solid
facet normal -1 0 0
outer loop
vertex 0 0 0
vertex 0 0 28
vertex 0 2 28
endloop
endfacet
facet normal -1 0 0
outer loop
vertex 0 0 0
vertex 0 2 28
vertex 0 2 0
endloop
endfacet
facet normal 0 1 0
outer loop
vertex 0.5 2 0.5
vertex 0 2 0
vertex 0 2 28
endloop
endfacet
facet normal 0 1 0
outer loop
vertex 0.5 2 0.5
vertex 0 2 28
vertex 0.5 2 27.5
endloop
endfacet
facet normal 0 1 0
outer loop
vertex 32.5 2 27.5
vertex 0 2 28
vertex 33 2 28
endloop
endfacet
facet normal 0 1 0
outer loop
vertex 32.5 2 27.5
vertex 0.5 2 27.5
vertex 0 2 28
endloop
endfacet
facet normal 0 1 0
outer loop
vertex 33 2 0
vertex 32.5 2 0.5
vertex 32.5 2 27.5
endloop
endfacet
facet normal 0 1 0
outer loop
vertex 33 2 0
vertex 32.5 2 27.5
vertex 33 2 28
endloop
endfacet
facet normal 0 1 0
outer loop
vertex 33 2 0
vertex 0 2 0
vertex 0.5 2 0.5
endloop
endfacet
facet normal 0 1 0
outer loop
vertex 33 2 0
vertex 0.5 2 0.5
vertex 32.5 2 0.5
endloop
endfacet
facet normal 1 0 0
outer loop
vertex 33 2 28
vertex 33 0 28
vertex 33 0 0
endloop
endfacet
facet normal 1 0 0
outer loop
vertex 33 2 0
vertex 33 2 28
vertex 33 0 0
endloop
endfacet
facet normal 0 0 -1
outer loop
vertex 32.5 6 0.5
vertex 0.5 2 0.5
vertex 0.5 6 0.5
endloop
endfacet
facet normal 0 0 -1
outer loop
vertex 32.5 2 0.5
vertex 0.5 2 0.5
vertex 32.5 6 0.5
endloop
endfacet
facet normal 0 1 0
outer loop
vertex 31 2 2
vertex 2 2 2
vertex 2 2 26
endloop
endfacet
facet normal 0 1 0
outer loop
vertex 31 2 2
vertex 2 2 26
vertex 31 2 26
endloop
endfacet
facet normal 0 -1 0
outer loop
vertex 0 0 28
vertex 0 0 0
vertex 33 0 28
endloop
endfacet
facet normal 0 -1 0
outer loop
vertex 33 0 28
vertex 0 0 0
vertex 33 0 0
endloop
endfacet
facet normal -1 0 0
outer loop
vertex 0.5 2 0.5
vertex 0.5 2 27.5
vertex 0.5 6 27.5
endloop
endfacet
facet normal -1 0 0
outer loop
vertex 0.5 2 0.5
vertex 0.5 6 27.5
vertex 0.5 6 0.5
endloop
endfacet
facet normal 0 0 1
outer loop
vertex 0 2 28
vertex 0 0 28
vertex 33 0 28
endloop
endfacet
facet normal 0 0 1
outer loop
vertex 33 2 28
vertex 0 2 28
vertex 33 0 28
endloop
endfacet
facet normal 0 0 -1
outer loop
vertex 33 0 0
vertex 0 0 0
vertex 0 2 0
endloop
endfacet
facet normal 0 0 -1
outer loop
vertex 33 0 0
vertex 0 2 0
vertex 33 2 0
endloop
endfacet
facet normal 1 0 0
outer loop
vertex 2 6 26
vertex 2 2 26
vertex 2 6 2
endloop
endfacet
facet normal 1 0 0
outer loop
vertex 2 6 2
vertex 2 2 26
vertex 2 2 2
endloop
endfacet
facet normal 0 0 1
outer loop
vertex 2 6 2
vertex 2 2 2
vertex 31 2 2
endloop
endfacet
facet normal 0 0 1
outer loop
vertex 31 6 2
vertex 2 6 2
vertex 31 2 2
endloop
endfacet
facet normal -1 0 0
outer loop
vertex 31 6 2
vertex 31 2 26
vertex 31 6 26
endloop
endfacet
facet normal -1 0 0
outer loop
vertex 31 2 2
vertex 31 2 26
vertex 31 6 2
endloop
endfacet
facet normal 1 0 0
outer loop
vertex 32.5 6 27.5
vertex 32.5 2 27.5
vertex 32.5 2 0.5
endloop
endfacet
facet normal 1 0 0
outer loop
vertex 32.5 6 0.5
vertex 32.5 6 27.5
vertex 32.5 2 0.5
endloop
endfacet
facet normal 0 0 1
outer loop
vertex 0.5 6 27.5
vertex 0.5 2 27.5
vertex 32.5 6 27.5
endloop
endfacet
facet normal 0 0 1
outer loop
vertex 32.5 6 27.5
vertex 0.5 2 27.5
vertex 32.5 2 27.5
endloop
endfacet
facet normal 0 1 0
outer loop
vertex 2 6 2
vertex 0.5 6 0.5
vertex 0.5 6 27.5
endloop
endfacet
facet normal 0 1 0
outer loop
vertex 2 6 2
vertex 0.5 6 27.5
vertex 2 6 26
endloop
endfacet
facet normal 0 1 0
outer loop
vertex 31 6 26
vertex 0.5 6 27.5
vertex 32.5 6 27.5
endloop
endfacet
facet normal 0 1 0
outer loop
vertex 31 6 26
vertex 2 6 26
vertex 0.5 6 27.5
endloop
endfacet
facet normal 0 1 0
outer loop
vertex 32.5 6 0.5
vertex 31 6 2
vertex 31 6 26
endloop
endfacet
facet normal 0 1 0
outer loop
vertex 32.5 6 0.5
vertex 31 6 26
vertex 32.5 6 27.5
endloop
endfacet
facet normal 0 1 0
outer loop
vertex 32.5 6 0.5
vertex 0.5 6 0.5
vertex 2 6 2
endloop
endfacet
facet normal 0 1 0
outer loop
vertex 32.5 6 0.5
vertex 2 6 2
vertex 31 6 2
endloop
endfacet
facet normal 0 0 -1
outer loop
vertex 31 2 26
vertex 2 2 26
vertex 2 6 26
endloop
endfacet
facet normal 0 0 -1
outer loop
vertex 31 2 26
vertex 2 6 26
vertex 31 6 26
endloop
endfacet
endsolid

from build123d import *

# Parameters (mm, degrees)
SKETCH_1_W      = 33
SKETCH_1_H      = 28
EXTRUDE_1_DEPTH = 2
SKETCH_2_W      = 32
SKETCH_2_H      = 27
SKETCH_2_W_2    = 29
SKETCH_2_H_2    = 24
EXTRUDE_2_DEPTH = 4


with BuildPart() as part:
    # 草图1 → 凸台-拉伸1 (new body)
    with BuildSketch(Plane(origin=(0, 0, 0), x_dir=(1, 0, 0), z_dir=(0, 1, 0))):
        with Locations((16.5, -14)):
            Rectangle(SKETCH_1_W, SKETCH_1_H)
    extrude(amount=EXTRUDE_1_DEPTH)

    # 草图2 → 凸台-拉伸2 (add)
    with BuildSketch(Plane(origin=(0, 2, 0), x_dir=(1, 0, 0), z_dir=(0, 1, 0))):
        with Locations((16.5, -14)):
            Rectangle(SKETCH_2_W, SKETCH_2_H)
        with Locations((16.5, -14)):
            Rectangle(SKETCH_2_W_2, SKETCH_2_H_2, mode=Mode.SUBTRACT)
    extrude(amount=EXTRUDE_2_DEPTH)


solid = part.part
